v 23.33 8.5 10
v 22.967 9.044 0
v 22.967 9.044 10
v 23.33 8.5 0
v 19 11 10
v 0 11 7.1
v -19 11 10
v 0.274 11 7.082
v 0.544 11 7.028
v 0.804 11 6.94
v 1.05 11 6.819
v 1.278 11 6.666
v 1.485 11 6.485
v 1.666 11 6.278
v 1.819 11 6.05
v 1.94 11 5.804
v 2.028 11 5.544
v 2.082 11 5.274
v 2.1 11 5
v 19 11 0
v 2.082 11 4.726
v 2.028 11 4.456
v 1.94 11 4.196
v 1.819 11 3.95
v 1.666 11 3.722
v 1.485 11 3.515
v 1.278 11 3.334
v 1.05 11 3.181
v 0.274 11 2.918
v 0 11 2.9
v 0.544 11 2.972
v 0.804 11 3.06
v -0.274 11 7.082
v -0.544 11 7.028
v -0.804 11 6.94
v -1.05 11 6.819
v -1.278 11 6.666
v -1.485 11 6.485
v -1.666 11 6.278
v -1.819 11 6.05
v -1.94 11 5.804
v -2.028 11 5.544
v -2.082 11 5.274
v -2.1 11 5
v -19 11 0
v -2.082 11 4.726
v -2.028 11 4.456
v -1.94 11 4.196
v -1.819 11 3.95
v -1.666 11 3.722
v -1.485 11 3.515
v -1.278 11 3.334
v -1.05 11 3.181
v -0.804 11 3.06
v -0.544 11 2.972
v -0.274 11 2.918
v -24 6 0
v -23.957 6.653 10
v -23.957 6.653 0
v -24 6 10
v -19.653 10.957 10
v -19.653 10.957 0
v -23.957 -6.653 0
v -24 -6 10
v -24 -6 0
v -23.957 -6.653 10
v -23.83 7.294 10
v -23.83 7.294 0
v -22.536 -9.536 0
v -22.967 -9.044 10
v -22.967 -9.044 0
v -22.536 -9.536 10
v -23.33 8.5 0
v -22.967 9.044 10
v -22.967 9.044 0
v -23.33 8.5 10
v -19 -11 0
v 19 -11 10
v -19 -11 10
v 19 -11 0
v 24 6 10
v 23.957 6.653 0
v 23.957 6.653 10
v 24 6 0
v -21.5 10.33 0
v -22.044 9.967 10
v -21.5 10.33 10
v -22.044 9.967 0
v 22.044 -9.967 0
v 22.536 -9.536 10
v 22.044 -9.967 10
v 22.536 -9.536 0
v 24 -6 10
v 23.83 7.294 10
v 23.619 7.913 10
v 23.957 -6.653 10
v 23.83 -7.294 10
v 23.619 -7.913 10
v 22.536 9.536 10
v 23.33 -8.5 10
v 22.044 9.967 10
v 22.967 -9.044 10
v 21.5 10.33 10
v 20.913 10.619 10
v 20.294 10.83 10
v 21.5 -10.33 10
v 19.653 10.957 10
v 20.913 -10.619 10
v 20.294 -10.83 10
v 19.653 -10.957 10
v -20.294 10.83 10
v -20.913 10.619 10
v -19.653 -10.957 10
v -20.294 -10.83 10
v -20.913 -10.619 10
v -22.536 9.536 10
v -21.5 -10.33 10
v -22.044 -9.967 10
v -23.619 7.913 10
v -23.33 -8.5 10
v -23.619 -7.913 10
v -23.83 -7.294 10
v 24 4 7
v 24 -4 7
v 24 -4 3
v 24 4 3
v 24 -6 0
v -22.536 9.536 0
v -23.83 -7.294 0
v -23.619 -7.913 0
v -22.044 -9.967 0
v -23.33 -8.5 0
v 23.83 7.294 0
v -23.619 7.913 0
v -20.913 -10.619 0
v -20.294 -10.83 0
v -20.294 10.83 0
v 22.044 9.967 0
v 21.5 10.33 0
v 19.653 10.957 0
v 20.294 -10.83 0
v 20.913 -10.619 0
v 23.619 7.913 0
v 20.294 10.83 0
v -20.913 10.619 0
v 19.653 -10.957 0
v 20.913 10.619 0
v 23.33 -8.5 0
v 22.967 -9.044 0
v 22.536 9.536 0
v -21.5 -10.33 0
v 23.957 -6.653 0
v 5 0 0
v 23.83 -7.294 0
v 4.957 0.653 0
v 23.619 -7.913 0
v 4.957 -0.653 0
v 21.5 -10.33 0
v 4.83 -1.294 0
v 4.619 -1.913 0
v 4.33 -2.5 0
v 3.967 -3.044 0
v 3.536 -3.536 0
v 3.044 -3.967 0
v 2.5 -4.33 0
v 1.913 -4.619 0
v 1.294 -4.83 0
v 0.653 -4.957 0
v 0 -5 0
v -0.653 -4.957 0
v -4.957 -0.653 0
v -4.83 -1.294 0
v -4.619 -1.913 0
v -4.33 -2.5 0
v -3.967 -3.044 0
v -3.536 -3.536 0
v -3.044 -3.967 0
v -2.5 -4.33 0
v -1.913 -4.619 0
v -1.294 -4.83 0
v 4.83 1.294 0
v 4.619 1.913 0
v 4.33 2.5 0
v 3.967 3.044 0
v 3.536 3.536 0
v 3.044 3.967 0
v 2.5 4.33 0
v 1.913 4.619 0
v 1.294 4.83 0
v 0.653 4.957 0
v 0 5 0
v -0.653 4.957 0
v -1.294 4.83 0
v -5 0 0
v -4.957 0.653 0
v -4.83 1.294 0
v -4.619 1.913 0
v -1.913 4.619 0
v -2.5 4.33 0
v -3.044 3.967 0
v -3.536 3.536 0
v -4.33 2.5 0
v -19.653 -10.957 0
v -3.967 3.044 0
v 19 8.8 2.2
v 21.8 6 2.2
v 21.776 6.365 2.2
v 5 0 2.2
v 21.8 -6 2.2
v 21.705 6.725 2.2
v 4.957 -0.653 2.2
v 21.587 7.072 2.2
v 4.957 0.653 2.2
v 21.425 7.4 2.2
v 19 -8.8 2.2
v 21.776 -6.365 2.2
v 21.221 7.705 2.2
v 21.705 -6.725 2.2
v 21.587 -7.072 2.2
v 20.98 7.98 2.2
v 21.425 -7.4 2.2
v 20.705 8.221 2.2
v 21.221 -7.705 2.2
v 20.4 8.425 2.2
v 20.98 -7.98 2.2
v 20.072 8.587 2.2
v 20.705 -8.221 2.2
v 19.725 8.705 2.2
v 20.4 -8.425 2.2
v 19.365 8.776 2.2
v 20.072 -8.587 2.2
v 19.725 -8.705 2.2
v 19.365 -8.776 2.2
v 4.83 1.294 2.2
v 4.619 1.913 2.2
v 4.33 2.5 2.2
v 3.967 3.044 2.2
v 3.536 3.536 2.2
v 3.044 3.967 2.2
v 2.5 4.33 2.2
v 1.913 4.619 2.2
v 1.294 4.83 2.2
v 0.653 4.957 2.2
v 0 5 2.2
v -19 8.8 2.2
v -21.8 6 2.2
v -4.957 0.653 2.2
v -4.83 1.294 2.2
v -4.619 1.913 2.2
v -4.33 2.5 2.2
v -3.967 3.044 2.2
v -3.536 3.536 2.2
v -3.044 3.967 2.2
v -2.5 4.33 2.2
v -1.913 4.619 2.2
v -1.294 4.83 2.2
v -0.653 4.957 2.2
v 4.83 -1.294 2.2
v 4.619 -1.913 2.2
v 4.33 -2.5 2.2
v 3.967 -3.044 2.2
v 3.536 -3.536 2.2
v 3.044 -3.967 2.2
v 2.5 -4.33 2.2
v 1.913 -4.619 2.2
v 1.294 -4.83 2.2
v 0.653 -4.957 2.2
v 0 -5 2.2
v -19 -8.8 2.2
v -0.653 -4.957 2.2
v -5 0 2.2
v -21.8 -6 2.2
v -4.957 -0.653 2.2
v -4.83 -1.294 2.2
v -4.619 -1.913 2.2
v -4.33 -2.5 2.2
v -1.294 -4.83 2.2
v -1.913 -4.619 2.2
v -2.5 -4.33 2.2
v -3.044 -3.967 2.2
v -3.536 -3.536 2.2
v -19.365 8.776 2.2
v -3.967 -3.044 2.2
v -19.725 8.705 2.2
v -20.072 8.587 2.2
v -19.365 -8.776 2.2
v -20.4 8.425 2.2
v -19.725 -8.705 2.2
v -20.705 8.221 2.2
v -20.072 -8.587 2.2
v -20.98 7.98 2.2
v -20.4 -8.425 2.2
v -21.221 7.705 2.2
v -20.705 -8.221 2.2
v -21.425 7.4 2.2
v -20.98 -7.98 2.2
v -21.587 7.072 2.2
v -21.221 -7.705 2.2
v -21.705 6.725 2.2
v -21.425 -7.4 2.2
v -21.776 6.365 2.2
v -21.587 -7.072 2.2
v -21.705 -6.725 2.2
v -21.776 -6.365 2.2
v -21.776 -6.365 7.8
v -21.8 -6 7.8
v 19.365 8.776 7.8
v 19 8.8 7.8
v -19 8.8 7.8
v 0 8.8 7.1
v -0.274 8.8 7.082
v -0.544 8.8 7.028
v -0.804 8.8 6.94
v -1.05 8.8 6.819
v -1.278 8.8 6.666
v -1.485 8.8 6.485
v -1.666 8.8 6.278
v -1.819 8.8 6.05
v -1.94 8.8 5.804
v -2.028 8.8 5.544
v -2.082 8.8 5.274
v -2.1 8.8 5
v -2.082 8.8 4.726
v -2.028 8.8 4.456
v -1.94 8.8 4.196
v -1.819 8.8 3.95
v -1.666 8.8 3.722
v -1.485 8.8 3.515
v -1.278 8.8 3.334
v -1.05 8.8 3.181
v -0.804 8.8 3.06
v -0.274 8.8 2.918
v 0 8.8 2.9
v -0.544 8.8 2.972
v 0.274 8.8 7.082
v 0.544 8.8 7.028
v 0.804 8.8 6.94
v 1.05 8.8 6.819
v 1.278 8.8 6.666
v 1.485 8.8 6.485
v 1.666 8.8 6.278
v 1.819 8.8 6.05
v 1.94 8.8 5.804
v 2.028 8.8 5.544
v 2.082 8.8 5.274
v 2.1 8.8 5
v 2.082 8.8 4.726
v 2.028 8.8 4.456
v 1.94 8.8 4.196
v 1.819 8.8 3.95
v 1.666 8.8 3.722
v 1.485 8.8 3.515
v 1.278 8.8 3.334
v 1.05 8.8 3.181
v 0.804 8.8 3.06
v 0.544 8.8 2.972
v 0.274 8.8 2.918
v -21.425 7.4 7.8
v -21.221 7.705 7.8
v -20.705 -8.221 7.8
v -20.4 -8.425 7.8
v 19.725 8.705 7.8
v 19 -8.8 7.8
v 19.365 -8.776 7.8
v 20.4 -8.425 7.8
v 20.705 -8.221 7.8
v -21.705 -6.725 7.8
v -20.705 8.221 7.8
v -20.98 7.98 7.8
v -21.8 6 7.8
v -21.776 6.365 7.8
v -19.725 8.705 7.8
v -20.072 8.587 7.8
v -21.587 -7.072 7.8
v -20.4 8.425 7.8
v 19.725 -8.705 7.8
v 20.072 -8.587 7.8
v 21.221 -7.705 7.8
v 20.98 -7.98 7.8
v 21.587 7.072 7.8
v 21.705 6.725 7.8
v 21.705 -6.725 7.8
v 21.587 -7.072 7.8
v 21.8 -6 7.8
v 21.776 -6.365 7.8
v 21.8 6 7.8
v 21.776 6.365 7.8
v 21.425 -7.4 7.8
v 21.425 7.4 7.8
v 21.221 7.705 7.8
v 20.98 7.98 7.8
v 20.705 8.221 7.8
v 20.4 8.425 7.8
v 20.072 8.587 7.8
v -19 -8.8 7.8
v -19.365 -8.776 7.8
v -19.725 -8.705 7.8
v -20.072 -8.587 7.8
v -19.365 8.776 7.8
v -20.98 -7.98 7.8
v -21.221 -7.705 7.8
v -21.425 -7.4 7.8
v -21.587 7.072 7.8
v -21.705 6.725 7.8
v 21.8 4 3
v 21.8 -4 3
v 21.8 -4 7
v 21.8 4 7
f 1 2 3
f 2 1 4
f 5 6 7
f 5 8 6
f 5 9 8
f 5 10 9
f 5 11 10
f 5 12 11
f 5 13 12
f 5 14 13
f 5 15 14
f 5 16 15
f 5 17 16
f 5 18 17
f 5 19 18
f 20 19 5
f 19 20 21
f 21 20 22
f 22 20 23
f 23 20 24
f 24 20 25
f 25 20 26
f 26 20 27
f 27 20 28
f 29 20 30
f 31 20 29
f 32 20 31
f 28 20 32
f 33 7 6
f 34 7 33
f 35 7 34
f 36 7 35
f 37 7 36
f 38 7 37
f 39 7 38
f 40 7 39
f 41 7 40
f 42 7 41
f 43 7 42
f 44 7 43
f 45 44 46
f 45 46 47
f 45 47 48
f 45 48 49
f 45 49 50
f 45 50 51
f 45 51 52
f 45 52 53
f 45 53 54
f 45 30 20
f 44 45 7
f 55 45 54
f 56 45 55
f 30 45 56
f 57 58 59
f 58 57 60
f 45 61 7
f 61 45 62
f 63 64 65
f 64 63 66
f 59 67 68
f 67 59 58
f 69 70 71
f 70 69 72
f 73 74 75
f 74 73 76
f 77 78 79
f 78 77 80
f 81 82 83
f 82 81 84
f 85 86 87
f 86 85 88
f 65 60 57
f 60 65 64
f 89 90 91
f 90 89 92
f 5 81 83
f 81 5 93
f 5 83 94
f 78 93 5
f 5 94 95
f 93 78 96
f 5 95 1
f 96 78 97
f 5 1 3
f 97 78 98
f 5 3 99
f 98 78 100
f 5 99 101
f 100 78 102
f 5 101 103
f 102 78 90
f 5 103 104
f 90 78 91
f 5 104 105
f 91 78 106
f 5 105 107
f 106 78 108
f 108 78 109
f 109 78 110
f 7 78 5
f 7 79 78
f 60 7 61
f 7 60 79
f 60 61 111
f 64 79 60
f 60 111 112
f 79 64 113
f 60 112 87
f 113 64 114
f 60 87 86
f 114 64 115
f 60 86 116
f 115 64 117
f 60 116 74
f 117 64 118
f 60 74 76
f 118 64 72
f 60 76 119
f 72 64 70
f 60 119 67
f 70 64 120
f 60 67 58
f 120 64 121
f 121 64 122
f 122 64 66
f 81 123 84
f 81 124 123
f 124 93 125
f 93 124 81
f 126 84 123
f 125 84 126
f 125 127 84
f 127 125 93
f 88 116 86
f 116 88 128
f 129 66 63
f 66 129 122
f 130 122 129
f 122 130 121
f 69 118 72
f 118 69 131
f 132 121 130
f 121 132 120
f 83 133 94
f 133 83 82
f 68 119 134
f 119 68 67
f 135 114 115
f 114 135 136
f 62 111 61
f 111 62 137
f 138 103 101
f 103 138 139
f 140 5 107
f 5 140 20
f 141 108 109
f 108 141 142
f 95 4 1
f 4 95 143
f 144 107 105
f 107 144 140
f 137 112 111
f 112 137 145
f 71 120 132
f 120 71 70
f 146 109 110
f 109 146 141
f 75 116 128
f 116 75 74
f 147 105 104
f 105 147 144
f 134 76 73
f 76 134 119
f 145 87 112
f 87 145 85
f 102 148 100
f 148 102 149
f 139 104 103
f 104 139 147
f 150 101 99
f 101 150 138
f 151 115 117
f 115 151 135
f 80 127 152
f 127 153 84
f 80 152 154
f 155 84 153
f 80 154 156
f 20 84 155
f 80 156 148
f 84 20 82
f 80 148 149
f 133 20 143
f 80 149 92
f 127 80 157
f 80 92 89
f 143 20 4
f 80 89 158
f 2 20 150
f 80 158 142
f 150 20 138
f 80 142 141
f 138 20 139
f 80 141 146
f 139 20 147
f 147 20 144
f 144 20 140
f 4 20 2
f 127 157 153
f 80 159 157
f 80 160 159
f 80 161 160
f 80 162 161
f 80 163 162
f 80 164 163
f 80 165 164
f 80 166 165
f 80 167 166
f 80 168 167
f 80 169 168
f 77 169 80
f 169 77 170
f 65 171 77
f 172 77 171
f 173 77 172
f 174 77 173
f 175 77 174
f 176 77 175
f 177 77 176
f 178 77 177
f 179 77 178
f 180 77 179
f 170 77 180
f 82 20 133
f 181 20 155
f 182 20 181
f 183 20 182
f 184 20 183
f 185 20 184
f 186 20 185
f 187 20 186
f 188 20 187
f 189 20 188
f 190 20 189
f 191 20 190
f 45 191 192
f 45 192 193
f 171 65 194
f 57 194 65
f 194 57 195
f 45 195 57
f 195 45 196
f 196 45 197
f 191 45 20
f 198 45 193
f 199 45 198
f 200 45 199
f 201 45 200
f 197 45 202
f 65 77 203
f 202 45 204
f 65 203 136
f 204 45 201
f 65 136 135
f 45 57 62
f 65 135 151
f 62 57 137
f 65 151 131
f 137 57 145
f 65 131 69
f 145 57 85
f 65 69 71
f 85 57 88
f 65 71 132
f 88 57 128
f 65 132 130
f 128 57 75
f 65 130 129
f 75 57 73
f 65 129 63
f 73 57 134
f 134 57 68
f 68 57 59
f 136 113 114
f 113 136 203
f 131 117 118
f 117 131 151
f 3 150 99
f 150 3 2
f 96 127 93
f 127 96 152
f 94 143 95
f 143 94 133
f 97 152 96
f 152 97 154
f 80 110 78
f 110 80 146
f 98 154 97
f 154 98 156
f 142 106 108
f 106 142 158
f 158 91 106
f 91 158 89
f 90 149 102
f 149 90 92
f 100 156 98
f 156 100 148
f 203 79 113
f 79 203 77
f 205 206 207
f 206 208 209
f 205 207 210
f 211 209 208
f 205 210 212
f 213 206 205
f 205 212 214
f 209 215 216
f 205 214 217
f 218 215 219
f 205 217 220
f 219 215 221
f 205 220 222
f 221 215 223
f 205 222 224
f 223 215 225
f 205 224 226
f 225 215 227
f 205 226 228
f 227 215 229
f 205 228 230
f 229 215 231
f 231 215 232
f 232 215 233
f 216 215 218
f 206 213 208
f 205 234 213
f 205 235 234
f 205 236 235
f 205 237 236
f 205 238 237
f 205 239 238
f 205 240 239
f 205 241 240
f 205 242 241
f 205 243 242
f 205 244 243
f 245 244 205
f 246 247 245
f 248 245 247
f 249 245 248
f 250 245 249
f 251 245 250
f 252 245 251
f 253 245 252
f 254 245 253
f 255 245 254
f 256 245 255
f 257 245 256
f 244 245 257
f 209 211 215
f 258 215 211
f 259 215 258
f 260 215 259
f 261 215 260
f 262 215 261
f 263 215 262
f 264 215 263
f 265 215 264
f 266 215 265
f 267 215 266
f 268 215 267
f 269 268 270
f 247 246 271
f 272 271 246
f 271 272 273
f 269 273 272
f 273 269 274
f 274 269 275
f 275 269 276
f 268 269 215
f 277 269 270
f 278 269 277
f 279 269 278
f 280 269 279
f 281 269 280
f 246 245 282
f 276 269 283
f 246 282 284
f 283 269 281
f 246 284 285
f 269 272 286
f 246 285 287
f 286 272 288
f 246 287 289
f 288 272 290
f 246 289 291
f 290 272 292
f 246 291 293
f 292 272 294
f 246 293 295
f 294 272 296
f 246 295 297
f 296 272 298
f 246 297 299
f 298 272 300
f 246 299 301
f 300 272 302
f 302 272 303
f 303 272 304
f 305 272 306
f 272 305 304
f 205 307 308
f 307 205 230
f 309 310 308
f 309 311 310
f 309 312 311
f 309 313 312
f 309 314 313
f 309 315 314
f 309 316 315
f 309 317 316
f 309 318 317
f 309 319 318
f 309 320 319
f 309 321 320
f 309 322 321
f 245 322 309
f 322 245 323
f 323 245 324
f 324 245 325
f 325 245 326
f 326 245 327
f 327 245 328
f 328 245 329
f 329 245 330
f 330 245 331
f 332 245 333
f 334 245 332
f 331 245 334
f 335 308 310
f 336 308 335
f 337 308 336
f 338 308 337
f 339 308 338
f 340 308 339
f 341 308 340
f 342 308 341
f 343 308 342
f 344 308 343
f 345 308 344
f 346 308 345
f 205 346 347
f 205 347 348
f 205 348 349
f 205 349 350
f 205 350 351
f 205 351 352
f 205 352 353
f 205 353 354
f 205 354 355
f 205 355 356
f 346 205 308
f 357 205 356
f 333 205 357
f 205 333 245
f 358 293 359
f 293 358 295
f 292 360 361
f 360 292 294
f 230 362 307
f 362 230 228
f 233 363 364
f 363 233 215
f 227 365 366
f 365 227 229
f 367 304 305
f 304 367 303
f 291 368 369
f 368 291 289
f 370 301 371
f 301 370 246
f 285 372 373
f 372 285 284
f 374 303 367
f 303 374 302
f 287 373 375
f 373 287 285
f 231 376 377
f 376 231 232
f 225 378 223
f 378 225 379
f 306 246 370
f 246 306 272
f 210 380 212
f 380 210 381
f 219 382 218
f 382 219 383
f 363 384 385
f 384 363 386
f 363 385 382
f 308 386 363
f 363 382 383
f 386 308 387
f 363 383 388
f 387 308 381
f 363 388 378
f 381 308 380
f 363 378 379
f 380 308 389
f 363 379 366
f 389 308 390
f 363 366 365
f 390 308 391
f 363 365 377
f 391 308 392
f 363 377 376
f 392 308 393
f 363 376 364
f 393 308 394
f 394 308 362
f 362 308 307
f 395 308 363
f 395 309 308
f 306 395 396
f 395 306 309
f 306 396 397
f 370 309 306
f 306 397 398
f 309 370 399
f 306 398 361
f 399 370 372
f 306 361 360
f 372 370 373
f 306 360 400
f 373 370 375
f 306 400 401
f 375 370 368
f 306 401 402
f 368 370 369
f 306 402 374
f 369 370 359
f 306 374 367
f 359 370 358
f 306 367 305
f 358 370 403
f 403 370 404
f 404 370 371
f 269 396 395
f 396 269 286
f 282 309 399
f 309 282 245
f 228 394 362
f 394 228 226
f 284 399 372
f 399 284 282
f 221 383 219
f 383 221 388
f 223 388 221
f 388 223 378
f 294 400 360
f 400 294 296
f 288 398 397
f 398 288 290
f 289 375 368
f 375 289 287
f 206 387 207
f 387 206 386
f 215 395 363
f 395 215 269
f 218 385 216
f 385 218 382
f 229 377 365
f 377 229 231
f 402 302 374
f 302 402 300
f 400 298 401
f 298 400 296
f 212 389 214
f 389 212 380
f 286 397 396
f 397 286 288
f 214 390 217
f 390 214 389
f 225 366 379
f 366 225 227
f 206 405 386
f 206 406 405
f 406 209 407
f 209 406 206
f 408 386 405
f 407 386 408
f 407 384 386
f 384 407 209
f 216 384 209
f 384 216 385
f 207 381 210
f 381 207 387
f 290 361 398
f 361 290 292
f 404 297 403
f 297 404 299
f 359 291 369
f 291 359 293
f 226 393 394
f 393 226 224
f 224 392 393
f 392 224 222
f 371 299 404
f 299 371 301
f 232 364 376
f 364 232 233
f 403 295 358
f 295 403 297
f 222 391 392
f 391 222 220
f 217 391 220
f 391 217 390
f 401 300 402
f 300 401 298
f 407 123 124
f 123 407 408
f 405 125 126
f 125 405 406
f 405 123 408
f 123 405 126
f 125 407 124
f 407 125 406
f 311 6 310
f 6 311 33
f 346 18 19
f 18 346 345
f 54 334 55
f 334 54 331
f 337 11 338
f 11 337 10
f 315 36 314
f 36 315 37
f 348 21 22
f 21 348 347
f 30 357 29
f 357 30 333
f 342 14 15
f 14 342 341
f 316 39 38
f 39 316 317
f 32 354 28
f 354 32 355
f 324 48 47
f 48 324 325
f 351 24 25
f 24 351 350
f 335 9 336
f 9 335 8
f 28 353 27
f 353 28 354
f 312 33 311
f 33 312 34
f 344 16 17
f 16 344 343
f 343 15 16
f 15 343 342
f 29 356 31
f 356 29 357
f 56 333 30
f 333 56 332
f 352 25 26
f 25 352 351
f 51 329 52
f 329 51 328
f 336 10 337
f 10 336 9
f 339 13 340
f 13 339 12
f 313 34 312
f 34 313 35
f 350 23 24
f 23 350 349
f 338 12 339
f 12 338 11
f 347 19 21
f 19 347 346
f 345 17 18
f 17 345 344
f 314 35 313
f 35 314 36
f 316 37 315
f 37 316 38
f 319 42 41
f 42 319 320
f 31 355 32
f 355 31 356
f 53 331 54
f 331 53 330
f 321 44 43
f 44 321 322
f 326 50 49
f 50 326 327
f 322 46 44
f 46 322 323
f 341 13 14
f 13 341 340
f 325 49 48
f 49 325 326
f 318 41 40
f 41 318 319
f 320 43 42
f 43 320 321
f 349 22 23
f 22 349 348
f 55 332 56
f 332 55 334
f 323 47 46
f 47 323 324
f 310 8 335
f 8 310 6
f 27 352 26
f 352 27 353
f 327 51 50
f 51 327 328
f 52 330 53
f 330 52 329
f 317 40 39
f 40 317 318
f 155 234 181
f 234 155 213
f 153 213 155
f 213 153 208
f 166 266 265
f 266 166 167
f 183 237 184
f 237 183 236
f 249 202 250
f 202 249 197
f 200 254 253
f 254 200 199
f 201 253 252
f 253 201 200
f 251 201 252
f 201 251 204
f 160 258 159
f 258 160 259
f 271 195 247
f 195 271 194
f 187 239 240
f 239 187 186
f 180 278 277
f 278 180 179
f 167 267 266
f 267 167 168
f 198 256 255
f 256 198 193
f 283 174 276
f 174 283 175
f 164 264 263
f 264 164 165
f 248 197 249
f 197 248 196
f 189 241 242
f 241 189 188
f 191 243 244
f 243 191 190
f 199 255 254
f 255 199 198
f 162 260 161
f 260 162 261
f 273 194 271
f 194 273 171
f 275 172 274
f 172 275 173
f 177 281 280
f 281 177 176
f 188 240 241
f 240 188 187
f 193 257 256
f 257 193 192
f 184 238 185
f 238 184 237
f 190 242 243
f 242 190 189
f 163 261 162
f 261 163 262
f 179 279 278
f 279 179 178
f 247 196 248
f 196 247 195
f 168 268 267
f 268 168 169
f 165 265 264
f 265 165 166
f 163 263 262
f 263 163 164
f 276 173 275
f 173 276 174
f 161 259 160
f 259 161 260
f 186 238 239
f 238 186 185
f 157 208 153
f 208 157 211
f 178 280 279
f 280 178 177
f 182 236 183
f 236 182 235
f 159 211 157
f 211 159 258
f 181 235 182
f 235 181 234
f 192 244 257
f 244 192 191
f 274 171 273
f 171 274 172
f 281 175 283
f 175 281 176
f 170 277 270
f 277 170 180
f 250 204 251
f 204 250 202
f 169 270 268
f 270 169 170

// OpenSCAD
$fn = 48;

//osnovne nastavitve
eps = 0.1;

//zunanje mere ohisja
outer_len = 48;
outer_wid = 22;
outer_hgt = 10;
outer_rad = 5;

//debelina sten
wall = 2.2;

//preboji odprtin
cavity_breakthrough = 0.8;

//mere odprtin
charge_port_w = 8;
charge_port_h = 4;
button_hole_d = 4.2;
sensor_open_d = 10;

//izklopljene reze za pas
add_strap_slots = false;

//notranje mere
inner_len = outer_len - 2*wall;
inner_wid = outer_wid - 2*wall;
inner_hgt = outer_hgt - 2*wall;
inner_rad = outer_rad - wall;

//polozaj notranje votline
cavity_z0 = wall;
cavity_z1 = wall + inner_hgt;

//meje zunanjega telesa
x_min = -outer_len/2;
x_max =  outer_len/2;
y_min = -outer_wid/2;
y_max =  outer_wid/2;
z_min = 0;
z_max = outer_hgt;

//meje notranje votline
inner_x_min = -inner_len/2;
inner_x_max =  inner_len/2;
inner_y_min = -inner_wid/2;
inner_y_max =  inner_wid/2;

//preverjanje pravilnih mer
assert(wall >= 2.2, "wall must be at least 2.2 mm");
assert(outer_len > 2*wall, "outer_len must be greater than 2*wall");
assert(outer_wid > 2*wall, "outer_wid must be greater than 2*wall");
assert(outer_hgt > 2*wall, "outer_hgt must be greater than 2*wall");
assert(outer_rad > wall, "outer_rad must be greater than wall");
assert(inner_rad > 0, "inner_rad must be positive");
assert(inner_len > 0, "inner_len must be positive");
assert(inner_wid > 0, "inner_wid must be positive");
assert(inner_hgt > 0, "inner_hgt must be positive");
assert(charge_port_w > 0 && charge_port_h > 0, "charging port dimensions must be positive");
assert(button_hole_d > 0, "button_hole_d must be positive");
assert(sensor_open_d > 0, "sensor_open_d must be positive");
assert(cavity_breakthrough >= 0.8, "cavity_breakthrough must be at least 0.8 mm");

assert(charge_port_w <= outer_wid - 2*wall, "charge_port_w too large for side wall region");
assert(charge_port_h <= outer_hgt - 2*wall, "charge_port_h too large for body height");
assert(button_hole_d <= outer_hgt - 2*wall, "button_hole_d too large for body height");
assert(sensor_open_d <= min(inner_len, inner_wid), "sensor_open_d too large for bottom opening");

//zaobljena skatla
module rounded_box_xy(len, wid, hgt, rad) {
    hull() {
        for (x = [-len/2 + rad, len/2 - rad])
            for (y = [-wid/2 + rad, wid/2 - rad])
                translate([x, y, 0])
                    cylinder(h = hgt, r = rad);
    }
}

//zunanje telo
module outer_shell() {
    rounded_box_xy(outer_len, outer_wid, outer_hgt, outer_rad);
}

//notranja votlina
module inner_cavity() {
    translate([0, 0, cavity_z0])
        rounded_box_xy(inner_len, inner_wid, inner_hgt, inner_rad);
}

//odprtina za polnjenje
module charging_port_cutout() {
    charge_cut_depth = wall + cavity_breakthrough + eps;

    translate([x_max - charge_cut_depth/2 + eps/2, 0, outer_hgt/2])
        cube([charge_cut_depth + eps, charge_port_w, charge_port_h], center = true);
}

//odprtina za gumb
module button_opening_cutout() {
    button_cut_depth = wall + cavity_breakthrough + eps;

    translate([0, y_max - button_cut_depth/2 + eps/2, outer_hgt/2])
        rotate([90, 0, 0])
            cylinder(h = button_cut_depth + eps, d = button_hole_d, center = true);
}

//spodnja odprtina za senzor
module sensor_opening_cutout() {
    sensor_cut_height = wall + cavity_breakthrough + eps;

    translate([0, 0, -eps])
        cylinder(h = sensor_cut_height + eps, d = sensor_open_d);
}

//koncno ohisje
module activity_tracker_casing() {
    difference() {
        outer_shell();

        inner_cavity();

        charging_port_cutout();
        button_opening_cutout();
        sensor_opening_cutout();
    }
}

//prikaz modela
activity_tracker_casing();
